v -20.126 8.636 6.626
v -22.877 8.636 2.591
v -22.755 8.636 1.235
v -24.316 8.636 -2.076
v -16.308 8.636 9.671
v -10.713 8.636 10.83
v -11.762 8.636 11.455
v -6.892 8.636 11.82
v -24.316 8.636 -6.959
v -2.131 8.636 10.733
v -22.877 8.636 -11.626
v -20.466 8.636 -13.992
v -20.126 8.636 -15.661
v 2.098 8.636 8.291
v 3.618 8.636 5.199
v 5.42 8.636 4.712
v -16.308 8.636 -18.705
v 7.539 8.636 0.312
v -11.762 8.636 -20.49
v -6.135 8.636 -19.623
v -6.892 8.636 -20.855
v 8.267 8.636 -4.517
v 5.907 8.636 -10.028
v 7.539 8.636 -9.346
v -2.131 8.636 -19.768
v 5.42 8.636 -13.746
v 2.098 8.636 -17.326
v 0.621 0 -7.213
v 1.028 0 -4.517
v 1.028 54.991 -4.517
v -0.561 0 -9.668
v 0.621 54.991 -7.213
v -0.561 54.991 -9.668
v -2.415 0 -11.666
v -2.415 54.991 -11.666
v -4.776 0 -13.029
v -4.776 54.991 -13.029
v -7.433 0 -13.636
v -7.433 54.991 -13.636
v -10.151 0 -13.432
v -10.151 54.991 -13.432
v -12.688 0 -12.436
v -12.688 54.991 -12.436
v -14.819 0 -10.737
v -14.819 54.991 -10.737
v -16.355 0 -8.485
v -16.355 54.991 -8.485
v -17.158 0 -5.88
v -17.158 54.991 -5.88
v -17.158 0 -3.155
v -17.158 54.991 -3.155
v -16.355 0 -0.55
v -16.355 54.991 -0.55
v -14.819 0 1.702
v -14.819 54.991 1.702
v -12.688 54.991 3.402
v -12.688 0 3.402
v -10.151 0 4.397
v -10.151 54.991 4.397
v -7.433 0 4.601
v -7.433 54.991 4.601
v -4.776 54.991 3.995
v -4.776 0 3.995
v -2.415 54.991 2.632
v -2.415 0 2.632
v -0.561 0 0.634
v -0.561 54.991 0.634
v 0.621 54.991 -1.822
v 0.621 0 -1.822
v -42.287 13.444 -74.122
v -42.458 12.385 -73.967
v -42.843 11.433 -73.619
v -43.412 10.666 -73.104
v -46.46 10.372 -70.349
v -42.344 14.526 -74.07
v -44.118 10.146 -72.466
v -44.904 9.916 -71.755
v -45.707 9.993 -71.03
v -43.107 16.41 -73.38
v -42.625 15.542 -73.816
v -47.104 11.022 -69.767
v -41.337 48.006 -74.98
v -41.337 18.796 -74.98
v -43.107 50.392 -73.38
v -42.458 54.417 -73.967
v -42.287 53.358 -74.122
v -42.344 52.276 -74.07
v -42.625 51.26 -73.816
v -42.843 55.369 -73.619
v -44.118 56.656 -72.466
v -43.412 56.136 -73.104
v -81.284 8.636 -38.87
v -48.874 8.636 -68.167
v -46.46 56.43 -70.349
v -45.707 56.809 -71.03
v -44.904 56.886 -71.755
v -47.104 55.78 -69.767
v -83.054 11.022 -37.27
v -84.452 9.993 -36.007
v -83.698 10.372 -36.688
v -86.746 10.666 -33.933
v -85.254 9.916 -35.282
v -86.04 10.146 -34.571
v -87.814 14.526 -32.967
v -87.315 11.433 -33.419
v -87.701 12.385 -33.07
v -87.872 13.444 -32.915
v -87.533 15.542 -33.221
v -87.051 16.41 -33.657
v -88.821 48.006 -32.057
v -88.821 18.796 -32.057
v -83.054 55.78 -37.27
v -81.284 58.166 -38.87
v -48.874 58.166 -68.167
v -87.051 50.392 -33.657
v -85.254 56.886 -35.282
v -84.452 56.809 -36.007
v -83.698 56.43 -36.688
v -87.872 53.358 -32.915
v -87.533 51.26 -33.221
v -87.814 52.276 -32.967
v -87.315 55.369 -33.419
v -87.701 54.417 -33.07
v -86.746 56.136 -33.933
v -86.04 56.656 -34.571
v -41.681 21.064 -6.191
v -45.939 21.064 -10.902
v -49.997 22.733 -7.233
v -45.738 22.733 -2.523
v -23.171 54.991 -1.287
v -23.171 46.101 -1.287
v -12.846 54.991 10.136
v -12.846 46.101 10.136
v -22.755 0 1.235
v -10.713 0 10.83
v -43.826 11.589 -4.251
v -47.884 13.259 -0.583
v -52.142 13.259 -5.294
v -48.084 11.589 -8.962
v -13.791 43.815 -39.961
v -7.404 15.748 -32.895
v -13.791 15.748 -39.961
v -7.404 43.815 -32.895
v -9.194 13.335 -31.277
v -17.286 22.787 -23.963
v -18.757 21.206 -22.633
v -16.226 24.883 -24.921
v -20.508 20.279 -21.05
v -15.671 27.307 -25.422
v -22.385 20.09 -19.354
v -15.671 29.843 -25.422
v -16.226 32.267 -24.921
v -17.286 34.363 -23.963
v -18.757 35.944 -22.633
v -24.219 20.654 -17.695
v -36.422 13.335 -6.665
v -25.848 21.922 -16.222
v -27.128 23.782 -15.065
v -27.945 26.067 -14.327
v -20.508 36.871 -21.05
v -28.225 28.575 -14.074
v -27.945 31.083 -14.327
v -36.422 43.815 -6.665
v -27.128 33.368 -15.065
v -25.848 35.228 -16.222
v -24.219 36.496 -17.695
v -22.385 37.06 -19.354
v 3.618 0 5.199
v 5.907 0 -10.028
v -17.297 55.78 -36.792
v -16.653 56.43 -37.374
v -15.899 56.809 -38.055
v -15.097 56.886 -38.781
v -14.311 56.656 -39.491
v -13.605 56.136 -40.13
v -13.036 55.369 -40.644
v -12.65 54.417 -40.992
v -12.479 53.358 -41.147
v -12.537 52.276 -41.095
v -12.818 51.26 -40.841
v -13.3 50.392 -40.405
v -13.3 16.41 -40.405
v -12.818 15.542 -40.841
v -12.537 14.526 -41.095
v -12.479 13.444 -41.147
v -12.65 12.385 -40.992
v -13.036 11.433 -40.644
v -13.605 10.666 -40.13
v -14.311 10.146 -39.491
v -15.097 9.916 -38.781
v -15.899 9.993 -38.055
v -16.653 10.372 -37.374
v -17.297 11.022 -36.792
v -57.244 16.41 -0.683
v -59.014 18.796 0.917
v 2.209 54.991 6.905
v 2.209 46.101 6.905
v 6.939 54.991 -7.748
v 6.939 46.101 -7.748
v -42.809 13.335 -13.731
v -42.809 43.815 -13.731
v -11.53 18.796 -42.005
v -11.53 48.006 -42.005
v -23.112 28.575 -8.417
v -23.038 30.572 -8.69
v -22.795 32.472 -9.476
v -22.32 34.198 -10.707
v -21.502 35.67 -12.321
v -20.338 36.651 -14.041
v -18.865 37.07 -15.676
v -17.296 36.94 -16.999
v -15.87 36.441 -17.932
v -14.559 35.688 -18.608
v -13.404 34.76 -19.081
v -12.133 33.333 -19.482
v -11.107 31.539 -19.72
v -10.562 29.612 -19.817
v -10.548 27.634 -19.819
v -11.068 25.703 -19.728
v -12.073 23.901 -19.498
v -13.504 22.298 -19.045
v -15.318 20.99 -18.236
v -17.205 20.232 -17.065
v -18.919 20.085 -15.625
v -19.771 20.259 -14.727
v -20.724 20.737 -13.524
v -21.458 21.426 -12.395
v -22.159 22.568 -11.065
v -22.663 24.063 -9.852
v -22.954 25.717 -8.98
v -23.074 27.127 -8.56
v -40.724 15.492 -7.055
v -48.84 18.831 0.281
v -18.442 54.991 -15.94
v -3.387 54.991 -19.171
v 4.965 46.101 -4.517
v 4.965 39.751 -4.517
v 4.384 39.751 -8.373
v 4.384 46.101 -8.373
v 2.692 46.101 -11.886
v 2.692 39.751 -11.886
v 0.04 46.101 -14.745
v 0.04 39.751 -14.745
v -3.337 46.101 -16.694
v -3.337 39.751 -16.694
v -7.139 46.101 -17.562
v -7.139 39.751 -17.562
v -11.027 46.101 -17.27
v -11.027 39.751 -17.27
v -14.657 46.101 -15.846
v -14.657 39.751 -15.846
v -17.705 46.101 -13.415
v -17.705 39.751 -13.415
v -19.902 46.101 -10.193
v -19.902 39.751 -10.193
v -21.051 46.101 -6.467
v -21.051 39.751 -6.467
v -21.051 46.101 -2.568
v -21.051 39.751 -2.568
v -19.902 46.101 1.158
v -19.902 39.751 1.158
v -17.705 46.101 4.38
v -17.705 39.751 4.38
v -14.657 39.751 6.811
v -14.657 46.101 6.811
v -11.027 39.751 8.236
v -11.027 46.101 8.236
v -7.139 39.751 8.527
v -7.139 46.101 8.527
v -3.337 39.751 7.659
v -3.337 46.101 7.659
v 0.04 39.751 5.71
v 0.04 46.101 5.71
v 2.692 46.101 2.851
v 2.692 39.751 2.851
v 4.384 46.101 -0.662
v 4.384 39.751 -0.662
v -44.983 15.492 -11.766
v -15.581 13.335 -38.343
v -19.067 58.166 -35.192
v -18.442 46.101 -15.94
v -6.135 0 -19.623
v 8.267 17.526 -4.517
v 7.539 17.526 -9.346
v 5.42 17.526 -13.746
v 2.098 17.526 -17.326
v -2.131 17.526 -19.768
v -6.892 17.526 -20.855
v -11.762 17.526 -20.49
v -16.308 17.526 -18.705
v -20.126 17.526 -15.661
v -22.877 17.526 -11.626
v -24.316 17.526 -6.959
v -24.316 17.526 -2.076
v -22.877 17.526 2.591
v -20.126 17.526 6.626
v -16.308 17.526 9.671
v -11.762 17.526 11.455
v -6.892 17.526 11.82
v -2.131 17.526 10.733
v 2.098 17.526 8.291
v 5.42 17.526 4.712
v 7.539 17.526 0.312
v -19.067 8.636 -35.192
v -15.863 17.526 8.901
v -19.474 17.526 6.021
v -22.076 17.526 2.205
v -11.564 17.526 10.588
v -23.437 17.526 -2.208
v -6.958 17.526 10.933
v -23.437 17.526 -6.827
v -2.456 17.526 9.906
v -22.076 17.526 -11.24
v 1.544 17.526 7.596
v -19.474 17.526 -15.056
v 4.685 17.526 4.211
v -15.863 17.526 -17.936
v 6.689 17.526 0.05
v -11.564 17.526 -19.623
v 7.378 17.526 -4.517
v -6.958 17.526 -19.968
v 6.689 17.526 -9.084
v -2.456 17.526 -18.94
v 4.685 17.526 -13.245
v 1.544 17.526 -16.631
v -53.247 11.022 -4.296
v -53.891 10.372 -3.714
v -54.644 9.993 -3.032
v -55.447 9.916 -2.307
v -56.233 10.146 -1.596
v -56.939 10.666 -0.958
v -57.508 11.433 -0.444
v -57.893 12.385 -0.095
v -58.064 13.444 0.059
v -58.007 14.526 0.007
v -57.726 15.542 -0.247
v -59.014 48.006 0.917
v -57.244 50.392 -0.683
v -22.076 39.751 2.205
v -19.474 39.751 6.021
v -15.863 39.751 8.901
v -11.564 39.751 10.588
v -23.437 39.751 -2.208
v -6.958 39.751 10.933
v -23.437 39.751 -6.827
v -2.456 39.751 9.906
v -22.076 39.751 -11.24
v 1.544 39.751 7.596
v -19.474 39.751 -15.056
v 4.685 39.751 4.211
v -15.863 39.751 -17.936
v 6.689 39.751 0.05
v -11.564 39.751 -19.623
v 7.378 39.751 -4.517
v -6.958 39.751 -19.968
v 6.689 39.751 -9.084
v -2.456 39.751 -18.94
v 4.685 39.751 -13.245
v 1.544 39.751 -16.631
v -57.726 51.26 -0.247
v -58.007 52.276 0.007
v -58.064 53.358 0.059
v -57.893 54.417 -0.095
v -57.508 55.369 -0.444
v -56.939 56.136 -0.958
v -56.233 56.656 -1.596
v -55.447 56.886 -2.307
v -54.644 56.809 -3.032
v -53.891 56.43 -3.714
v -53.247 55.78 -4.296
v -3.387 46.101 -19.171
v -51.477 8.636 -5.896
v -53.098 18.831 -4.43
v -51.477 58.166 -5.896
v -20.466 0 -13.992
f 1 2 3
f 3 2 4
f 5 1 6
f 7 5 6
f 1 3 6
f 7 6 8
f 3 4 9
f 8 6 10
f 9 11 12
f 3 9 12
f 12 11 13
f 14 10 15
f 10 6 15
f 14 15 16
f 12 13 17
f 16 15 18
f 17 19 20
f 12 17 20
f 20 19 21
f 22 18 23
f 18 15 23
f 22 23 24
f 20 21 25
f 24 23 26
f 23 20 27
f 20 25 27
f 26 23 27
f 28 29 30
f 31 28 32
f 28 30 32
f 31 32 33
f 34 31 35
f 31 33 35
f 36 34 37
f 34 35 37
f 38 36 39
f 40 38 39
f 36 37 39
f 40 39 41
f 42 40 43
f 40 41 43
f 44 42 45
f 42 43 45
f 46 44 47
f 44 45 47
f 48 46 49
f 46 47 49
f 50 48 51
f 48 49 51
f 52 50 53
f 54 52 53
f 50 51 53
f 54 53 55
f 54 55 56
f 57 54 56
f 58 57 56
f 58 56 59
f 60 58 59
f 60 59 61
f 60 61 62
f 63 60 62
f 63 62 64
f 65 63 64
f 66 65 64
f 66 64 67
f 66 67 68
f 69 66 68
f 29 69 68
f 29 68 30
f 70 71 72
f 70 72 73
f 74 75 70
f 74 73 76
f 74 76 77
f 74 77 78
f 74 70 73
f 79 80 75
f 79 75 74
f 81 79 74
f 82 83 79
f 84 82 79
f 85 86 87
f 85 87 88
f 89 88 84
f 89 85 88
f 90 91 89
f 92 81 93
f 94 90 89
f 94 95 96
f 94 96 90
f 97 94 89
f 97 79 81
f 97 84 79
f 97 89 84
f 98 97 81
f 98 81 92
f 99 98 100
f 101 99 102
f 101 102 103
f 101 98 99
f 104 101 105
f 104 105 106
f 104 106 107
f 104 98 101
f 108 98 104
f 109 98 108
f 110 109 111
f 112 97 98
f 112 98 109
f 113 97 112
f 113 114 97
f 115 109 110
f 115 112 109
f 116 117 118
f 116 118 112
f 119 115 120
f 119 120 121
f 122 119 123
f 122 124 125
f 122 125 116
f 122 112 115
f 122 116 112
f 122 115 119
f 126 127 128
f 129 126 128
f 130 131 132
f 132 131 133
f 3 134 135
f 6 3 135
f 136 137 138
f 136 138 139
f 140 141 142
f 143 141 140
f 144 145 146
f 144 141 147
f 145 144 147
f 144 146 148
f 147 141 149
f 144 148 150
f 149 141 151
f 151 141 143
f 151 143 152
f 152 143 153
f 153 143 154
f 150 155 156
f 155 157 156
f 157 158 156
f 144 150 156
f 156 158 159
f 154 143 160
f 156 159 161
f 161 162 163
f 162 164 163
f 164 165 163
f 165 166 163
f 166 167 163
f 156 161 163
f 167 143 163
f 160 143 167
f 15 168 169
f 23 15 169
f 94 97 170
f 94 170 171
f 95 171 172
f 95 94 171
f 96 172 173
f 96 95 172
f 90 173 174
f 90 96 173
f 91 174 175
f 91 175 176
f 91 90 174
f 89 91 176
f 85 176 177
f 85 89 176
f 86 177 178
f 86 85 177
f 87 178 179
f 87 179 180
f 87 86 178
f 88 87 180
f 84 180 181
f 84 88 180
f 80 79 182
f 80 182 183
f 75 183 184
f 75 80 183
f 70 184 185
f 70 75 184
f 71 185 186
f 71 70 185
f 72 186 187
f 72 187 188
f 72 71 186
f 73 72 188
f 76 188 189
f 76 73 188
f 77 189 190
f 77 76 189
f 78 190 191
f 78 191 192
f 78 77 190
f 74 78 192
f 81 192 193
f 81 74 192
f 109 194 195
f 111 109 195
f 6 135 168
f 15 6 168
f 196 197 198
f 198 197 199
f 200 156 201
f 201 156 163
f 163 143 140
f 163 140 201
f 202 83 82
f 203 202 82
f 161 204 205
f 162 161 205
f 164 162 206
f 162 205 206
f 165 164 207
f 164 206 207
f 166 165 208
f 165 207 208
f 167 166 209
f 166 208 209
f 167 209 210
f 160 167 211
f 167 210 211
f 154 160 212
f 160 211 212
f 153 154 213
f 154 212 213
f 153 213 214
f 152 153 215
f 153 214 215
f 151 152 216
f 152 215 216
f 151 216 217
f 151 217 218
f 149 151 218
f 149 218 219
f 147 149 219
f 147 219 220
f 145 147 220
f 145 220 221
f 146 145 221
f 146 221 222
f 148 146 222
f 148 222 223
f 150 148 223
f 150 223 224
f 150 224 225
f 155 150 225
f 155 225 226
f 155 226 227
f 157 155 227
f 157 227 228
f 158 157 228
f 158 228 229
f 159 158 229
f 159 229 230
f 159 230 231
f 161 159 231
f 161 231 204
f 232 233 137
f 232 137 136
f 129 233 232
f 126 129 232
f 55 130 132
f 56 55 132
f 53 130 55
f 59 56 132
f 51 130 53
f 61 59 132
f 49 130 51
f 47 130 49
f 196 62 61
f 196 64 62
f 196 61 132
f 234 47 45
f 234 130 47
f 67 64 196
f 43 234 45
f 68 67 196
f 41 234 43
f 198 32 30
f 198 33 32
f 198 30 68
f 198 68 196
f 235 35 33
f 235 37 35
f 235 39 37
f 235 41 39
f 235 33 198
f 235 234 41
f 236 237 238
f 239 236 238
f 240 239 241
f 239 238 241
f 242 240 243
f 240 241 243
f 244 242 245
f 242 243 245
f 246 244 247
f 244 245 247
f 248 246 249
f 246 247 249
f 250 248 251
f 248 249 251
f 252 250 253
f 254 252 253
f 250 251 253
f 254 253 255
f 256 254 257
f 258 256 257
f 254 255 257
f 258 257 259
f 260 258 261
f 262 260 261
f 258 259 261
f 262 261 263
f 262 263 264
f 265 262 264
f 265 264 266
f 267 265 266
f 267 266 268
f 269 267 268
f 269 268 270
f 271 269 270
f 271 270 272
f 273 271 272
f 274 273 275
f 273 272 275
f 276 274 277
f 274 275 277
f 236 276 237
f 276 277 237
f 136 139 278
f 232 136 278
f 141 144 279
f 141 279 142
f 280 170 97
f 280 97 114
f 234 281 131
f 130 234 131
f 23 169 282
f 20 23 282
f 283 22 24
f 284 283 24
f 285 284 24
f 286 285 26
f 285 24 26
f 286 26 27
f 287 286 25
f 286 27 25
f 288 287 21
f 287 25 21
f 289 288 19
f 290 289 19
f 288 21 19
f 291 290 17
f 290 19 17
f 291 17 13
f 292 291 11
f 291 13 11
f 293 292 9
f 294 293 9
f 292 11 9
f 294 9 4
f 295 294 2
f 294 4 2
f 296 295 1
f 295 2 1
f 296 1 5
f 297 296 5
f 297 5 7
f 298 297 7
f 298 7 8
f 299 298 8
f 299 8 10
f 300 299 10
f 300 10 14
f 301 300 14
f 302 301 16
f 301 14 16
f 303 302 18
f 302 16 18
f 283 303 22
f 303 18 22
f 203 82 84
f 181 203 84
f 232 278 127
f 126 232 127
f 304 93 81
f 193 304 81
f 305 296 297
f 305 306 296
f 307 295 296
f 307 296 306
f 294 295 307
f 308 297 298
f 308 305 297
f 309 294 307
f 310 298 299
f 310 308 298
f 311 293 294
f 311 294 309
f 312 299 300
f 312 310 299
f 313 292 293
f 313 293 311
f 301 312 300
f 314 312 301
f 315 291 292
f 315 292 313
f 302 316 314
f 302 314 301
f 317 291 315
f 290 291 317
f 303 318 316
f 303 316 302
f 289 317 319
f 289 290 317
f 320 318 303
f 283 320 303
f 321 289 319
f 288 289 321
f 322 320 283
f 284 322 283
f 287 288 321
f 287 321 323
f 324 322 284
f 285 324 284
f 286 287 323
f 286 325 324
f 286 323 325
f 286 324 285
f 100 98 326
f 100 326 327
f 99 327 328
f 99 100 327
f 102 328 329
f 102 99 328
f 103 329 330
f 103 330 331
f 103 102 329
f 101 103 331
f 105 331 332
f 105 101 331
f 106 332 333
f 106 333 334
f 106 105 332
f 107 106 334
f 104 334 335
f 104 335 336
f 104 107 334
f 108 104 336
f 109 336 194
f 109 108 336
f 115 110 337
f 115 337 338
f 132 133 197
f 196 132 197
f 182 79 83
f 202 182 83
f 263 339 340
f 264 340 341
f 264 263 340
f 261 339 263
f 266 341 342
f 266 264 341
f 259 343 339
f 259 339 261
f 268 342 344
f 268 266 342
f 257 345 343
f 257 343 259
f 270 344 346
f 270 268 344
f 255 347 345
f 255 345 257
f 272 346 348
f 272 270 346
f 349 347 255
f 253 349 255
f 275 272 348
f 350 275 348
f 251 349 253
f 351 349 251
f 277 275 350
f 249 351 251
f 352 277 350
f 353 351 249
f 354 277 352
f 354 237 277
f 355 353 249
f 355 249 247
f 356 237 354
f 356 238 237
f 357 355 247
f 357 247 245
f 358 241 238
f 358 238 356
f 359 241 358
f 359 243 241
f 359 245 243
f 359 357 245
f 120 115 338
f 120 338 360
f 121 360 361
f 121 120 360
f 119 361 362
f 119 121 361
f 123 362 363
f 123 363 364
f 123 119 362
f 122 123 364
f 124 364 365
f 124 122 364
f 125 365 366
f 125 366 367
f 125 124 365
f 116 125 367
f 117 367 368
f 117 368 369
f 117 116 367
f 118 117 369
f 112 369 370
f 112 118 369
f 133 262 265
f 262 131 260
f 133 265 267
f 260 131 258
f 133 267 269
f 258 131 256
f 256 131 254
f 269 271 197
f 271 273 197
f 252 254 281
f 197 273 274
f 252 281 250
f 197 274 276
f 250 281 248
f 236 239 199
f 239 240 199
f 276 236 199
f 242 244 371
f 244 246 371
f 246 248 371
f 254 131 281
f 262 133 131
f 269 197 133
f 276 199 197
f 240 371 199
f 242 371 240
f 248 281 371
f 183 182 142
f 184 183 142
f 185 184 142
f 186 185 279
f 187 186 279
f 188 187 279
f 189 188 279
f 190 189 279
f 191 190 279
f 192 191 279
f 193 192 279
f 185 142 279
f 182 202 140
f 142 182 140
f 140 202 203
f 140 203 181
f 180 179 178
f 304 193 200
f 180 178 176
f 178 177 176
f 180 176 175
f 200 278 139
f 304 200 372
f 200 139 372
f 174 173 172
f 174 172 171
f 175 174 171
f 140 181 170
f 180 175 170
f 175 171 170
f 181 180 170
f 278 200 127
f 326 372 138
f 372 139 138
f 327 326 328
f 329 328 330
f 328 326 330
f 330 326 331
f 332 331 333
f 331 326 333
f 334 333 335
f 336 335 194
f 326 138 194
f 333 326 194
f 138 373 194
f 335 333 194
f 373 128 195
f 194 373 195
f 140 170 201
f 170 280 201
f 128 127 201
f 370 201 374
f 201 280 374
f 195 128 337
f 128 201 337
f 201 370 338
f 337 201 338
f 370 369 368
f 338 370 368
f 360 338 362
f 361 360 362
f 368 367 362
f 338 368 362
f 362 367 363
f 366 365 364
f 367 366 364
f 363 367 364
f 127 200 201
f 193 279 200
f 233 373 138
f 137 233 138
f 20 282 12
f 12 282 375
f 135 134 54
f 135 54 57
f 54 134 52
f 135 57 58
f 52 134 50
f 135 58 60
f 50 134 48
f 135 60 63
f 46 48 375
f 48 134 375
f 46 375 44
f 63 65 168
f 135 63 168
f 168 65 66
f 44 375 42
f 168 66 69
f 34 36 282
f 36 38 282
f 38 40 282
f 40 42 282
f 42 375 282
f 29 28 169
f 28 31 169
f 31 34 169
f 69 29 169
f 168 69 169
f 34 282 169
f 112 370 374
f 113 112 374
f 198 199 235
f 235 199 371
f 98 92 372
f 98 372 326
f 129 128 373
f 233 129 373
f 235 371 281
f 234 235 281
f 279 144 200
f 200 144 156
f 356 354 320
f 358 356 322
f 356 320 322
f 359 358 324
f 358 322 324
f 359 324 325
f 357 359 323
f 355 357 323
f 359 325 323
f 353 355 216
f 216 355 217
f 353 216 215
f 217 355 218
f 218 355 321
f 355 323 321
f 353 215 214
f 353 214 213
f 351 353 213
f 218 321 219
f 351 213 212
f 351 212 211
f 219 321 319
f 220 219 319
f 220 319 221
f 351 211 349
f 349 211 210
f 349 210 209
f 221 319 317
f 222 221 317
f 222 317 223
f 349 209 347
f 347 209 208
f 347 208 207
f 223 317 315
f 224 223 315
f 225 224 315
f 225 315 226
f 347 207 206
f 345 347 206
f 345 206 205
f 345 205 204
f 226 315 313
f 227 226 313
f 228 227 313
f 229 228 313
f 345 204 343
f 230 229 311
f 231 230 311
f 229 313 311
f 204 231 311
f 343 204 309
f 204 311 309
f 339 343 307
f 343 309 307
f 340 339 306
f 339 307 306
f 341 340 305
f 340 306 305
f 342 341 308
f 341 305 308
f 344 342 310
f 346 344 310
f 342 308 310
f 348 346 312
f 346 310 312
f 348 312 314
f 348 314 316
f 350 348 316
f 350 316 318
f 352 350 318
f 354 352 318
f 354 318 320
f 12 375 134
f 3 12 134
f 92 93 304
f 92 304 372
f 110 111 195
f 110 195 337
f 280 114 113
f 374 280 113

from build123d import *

# Parameters (mm, degrees)
BOSS_EXTRUDE1_DEPTH  = 8.636
SKETCH2_R            = 16.383
BOSS_EXTRUDE2_DEPTH  = 8.89
SKETCH5_R            = 15.494
BOSS_EXTRUDE3_DEPTH  = 22.225
SKETCH6_R            = 13.081
BOSS_EXTRUDE4_DEPTH  = 6.35
BOSS_EXTRUDE5_DEPTH  = 8.89
SKETCH19_R           = 8.509
BOSS_EXTRUDE9_DEPTH  = 20.574
SKETCH26_R           = 9.144
CUT_EXTRUDE1_DEPTH   = 55.991
SKETCH28_W           = 39.116
SKETCH28_H           = 30.48
BOSS_EXTRUDE11_DEPTH = 9.525
SKETCH29_W           = 64.008
SKETCH29_H           = 49.53
BOSS_EXTRUDE12_DEPTH = 44.45
BOSS_EXTRUDE13_DEPTH = 6.35
CUT_EXTRUDE2_REACH   = 99.689
BOSS_EXTRUDE14_DEPTH = 44.45


with BuildPart() as part:
    # Sketch1 → Boss-Extrude1 (new body)
    with BuildSketch(Plane(origin=(0, 0, 0), x_dir=(1, 0, 0), z_dir=(0, 1, 0))):
        Polygon((3.618323339, -5.199254385), (5.90723301, 10.02760322), (-6.13515766, 19.623285945), (-20.466458001, 13.992111064), (-22.755367672, -1.234746541), (-10.712977002, -10.830429265), align=None)
    extrude(amount=BOSS_EXTRUDE1_DEPTH)

    # Sketch2 → Boss-Extrude2 (add)
    with BuildSketch(Plane(origin=(0, 8.636, 0), x_dir=(1, 0, 0), z_dir=(0, 1, 0))):
        with Locations((-8.116287221, 4.517363885)):
            Circle(SKETCH2_R)
    extrude(amount=BOSS_EXTRUDE2_DEPTH)

    # Sketch5 → Boss-Extrude3 (add)
    with BuildSketch(Plane(origin=(0, 17.526, 0), x_dir=(1, 0, 0), z_dir=(0, 1, 0))):
        with Locations((-8.116287221, 4.517363885)):
            Circle(SKETCH5_R)
    extrude(amount=BOSS_EXTRUDE3_DEPTH)

    # Sketch6 → Boss-Extrude4 (add)
    with BuildSketch(Plane(origin=(0, 39.751, 0), x_dir=(1, 0, 0), z_dir=(0, 1, 0))):
        with Locations((-8.116287221, 4.517363885)):
            Circle(SKETCH6_R)
    extrude(amount=BOSS_EXTRUDE4_DEPTH)

    # Sketch8 → Boss-Extrude5 (add)
    with BuildSketch(Plane(origin=(0, 46.101, 0), x_dir=(1, 0, 0), z_dir=(0, 1, 0))):
        Polygon((-18.441823617, 15.940130543), (-23.171461527, 1.286570387), (-12.845925131, -10.136196271), (2.209249175, -6.905402773), (6.938887085, 7.748157383), (-3.386649312, 19.170924041), align=None)
    extrude(amount=BOSS_EXTRUDE5_DEPTH)

    # Sketch19 → Boss-Extrude9 (add)
    with BuildSketch(Plane(origin=(-5.896918877, 0, -6.523547615), x_dir=(-0.741837728, 0, 0.67057944), z_dir=(-0.67057944, 0, -0.741837728))):
        with Locations((2.991716732, 28.575)):
            Circle(SKETCH19_R)
    extrude(amount=BOSS_EXTRUDE9_DEPTH)

    # Sketch26 → Cut-Extrude1 (cut, through all)
    with BuildSketch(Plane(origin=(0, 54.991, 0), x_dir=(1, 0, 0), z_dir=(0, 1, 0))):
        with Locations((-8.116287221, 4.517363885)):
            Circle(SKETCH26_R)
    extrude(amount=-CUT_EXTRUDE1_DEPTH, mode=Mode.SUBTRACT)

    # Sketch28 → Boss-Extrude11 (add)
    with BuildSketch(Plane(origin=(-19.693420267, 0, -21.786117038), x_dir=(-0.741837728, 0, 0.67057944), z_dir=(-0.67057944, 0, -0.741837728))):
        with Locations((2.991716732, 28.575)):
            Rectangle(SKETCH28_W, SKETCH28_H)
    extrude(amount=BOSS_EXTRUDE11_DEPTH)

    # Sketch29 → Boss-Extrude12 (add)
    with BuildSketch(Plane(origin=(-26.080689429, 0, -28.852121401), x_dir=(-0.741837728, 0, 0.67057944), z_dir=(-0.67057944, 0, -0.741837728))):
        with Locations((12.389716732, 33.401)):
            Rectangle(SKETCH29_W, SKETCH29_H)
    extrude(amount=BOSS_EXTRUDE12_DEPTH)

    # Sketch31 → Boss-Extrude13 (add)
    with BuildSketch(Plane(origin=(-26.080689429, 0, -28.852121401), x_dir=(0.741837728, 0, -0.67057944), z_dir=(0.67057944, 0, 0.741837728))):
        Polygon((-29.660890196, 11.58925085), (-25.479774792, 15.49154325), (-26.768701441, 21.063641607), (-32.238743495, 22.733447563), (-36.419858899, 18.831155162), (-35.130932249, 13.259056806), align=None)
    extrude(amount=BOSS_EXTRUDE13_DEPTH)

    # Sketch36 → Cut-Extrude2 (cut, up to next)
    with BuildSketch(Plane(origin=(-55.887945518, 0, -61.826808426), x_dir=(-0.741837728, 0, 0.67057944), z_dir=(-0.67057944, 0, -0.741837728)), mode=Mode.PRIVATE) as cut_extrude2_sk1:
        Polygon((34.233716732, 8.636), (44.393716732, 18.796), (44.393716732, 8.636), align=None)
    cut_extrude2_tool1 = extrude(cut_extrude2_sk1.sketch, amount=-CUT_EXTRUDE2_REACH, mode=Mode.PRIVATE) & part.part
    add(cut_extrude2_tool1.solids().sort_by_distance((-86.308522, 12.022667, -34.328324))[0], mode=Mode.SUBTRACT)
    # Sketch36 → Cut-Extrude2 (cut, up to next)
    with BuildSketch(Plane(origin=(-55.887945518, 0, -61.826808426), x_dir=(-0.741837728, 0, 0.67057944), z_dir=(-0.67057944, 0, -0.741837728)), mode=Mode.PRIVATE) as cut_extrude2_sk2:
        Polygon((-9.454283268, 8.636), (-19.614283268, 18.796), (-19.614283268, 8.636), align=None)
    cut_extrude2_tool2 = extrude(cut_extrude2_sk2.sketch, amount=-CUT_EXTRUDE2_REACH, mode=Mode.PRIVATE) & part.part
    add(cut_extrude2_tool2.solids().sort_by_distance((-43.849687, 12.022667, -72.708714))[0], mode=Mode.SUBTRACT)
    # Sketch36 → Cut-Extrude2 (cut, up to next)
    with BuildSketch(Plane(origin=(-55.887945518, 0, -61.826808426), x_dir=(-0.741837728, 0, 0.67057944), z_dir=(-0.67057944, 0, -0.741837728)), mode=Mode.PRIVATE) as cut_extrude2_sk3:
        Polygon((-19.614283268, 48.006), (-9.454283268, 58.166), (-19.614283268, 58.166), align=None)
    cut_extrude2_tool3 = extrude(cut_extrude2_sk3.sketch, amount=-CUT_EXTRUDE2_REACH, mode=Mode.PRIVATE) & part.part
    add(cut_extrude2_tool3.solids().sort_by_distance((-43.849687, 54.779333, -72.708714))[0], mode=Mode.SUBTRACT)
    # Sketch36 → Cut-Extrude2 (cut, up to next)
    with BuildSketch(Plane(origin=(-55.887945518, 0, -61.826808426), x_dir=(-0.741837728, 0, 0.67057944), z_dir=(-0.67057944, 0, -0.741837728)), mode=Mode.PRIVATE) as cut_extrude2_sk4:
        Polygon((44.393716732, 48.006), (34.233716732, 58.166), (44.393716732, 58.166), align=None)
    cut_extrude2_tool4 = extrude(cut_extrude2_sk4.sketch, amount=-CUT_EXTRUDE2_REACH, mode=Mode.PRIVATE) & part.part
    add(cut_extrude2_tool4.solids().sort_by_distance((-86.308522, 54.779333, -34.328324))[0], mode=Mode.SUBTRACT)

    # Sketch37 → Boss-Extrude14 (add)
    with BuildSketch(Plane(origin=(-55.887945518, 0, -61.826808426), x_dir=(-0.741837728, 0, 0.67057944), z_dir=(-0.67057944, 0, -0.741837728))):
        with BuildLine():
            Line((42.007793569, 16.410076836), (36.619639896, 11.021923164))
            ThreePointArc((36.619639896, 11.021923164), (42.007793569, 11.021923164), (42.007793569, 16.410076836))
        make_face()
        with BuildLine():
            Line((-11.840206431, 11.021923164), (-17.228360104, 16.410076836))
            ThreePointArc((-17.228360104, 16.410076836), (-17.228360104, 11.021923164), (-11.840206431, 11.021923164))
        make_face()
        with BuildLine():
            Line((-17.228360104, 50.391923164), (-11.840206431, 55.780076836))
            ThreePointArc((-11.840206431, 55.780076836), (-17.228360104, 55.780076836), (-17.228360104, 50.391923164))
        make_face()
        with BuildLine():
            Line((36.619639896, 55.780076836), (42.007793569, 50.391923164))
            ThreePointArc((42.007793569, 50.391923164), (42.007793569, 55.780076836), (36.619639896, 55.780076836))
        make_face()
    extrude(amount=-BOSS_EXTRUDE14_DEPTH)


solid = part.part
